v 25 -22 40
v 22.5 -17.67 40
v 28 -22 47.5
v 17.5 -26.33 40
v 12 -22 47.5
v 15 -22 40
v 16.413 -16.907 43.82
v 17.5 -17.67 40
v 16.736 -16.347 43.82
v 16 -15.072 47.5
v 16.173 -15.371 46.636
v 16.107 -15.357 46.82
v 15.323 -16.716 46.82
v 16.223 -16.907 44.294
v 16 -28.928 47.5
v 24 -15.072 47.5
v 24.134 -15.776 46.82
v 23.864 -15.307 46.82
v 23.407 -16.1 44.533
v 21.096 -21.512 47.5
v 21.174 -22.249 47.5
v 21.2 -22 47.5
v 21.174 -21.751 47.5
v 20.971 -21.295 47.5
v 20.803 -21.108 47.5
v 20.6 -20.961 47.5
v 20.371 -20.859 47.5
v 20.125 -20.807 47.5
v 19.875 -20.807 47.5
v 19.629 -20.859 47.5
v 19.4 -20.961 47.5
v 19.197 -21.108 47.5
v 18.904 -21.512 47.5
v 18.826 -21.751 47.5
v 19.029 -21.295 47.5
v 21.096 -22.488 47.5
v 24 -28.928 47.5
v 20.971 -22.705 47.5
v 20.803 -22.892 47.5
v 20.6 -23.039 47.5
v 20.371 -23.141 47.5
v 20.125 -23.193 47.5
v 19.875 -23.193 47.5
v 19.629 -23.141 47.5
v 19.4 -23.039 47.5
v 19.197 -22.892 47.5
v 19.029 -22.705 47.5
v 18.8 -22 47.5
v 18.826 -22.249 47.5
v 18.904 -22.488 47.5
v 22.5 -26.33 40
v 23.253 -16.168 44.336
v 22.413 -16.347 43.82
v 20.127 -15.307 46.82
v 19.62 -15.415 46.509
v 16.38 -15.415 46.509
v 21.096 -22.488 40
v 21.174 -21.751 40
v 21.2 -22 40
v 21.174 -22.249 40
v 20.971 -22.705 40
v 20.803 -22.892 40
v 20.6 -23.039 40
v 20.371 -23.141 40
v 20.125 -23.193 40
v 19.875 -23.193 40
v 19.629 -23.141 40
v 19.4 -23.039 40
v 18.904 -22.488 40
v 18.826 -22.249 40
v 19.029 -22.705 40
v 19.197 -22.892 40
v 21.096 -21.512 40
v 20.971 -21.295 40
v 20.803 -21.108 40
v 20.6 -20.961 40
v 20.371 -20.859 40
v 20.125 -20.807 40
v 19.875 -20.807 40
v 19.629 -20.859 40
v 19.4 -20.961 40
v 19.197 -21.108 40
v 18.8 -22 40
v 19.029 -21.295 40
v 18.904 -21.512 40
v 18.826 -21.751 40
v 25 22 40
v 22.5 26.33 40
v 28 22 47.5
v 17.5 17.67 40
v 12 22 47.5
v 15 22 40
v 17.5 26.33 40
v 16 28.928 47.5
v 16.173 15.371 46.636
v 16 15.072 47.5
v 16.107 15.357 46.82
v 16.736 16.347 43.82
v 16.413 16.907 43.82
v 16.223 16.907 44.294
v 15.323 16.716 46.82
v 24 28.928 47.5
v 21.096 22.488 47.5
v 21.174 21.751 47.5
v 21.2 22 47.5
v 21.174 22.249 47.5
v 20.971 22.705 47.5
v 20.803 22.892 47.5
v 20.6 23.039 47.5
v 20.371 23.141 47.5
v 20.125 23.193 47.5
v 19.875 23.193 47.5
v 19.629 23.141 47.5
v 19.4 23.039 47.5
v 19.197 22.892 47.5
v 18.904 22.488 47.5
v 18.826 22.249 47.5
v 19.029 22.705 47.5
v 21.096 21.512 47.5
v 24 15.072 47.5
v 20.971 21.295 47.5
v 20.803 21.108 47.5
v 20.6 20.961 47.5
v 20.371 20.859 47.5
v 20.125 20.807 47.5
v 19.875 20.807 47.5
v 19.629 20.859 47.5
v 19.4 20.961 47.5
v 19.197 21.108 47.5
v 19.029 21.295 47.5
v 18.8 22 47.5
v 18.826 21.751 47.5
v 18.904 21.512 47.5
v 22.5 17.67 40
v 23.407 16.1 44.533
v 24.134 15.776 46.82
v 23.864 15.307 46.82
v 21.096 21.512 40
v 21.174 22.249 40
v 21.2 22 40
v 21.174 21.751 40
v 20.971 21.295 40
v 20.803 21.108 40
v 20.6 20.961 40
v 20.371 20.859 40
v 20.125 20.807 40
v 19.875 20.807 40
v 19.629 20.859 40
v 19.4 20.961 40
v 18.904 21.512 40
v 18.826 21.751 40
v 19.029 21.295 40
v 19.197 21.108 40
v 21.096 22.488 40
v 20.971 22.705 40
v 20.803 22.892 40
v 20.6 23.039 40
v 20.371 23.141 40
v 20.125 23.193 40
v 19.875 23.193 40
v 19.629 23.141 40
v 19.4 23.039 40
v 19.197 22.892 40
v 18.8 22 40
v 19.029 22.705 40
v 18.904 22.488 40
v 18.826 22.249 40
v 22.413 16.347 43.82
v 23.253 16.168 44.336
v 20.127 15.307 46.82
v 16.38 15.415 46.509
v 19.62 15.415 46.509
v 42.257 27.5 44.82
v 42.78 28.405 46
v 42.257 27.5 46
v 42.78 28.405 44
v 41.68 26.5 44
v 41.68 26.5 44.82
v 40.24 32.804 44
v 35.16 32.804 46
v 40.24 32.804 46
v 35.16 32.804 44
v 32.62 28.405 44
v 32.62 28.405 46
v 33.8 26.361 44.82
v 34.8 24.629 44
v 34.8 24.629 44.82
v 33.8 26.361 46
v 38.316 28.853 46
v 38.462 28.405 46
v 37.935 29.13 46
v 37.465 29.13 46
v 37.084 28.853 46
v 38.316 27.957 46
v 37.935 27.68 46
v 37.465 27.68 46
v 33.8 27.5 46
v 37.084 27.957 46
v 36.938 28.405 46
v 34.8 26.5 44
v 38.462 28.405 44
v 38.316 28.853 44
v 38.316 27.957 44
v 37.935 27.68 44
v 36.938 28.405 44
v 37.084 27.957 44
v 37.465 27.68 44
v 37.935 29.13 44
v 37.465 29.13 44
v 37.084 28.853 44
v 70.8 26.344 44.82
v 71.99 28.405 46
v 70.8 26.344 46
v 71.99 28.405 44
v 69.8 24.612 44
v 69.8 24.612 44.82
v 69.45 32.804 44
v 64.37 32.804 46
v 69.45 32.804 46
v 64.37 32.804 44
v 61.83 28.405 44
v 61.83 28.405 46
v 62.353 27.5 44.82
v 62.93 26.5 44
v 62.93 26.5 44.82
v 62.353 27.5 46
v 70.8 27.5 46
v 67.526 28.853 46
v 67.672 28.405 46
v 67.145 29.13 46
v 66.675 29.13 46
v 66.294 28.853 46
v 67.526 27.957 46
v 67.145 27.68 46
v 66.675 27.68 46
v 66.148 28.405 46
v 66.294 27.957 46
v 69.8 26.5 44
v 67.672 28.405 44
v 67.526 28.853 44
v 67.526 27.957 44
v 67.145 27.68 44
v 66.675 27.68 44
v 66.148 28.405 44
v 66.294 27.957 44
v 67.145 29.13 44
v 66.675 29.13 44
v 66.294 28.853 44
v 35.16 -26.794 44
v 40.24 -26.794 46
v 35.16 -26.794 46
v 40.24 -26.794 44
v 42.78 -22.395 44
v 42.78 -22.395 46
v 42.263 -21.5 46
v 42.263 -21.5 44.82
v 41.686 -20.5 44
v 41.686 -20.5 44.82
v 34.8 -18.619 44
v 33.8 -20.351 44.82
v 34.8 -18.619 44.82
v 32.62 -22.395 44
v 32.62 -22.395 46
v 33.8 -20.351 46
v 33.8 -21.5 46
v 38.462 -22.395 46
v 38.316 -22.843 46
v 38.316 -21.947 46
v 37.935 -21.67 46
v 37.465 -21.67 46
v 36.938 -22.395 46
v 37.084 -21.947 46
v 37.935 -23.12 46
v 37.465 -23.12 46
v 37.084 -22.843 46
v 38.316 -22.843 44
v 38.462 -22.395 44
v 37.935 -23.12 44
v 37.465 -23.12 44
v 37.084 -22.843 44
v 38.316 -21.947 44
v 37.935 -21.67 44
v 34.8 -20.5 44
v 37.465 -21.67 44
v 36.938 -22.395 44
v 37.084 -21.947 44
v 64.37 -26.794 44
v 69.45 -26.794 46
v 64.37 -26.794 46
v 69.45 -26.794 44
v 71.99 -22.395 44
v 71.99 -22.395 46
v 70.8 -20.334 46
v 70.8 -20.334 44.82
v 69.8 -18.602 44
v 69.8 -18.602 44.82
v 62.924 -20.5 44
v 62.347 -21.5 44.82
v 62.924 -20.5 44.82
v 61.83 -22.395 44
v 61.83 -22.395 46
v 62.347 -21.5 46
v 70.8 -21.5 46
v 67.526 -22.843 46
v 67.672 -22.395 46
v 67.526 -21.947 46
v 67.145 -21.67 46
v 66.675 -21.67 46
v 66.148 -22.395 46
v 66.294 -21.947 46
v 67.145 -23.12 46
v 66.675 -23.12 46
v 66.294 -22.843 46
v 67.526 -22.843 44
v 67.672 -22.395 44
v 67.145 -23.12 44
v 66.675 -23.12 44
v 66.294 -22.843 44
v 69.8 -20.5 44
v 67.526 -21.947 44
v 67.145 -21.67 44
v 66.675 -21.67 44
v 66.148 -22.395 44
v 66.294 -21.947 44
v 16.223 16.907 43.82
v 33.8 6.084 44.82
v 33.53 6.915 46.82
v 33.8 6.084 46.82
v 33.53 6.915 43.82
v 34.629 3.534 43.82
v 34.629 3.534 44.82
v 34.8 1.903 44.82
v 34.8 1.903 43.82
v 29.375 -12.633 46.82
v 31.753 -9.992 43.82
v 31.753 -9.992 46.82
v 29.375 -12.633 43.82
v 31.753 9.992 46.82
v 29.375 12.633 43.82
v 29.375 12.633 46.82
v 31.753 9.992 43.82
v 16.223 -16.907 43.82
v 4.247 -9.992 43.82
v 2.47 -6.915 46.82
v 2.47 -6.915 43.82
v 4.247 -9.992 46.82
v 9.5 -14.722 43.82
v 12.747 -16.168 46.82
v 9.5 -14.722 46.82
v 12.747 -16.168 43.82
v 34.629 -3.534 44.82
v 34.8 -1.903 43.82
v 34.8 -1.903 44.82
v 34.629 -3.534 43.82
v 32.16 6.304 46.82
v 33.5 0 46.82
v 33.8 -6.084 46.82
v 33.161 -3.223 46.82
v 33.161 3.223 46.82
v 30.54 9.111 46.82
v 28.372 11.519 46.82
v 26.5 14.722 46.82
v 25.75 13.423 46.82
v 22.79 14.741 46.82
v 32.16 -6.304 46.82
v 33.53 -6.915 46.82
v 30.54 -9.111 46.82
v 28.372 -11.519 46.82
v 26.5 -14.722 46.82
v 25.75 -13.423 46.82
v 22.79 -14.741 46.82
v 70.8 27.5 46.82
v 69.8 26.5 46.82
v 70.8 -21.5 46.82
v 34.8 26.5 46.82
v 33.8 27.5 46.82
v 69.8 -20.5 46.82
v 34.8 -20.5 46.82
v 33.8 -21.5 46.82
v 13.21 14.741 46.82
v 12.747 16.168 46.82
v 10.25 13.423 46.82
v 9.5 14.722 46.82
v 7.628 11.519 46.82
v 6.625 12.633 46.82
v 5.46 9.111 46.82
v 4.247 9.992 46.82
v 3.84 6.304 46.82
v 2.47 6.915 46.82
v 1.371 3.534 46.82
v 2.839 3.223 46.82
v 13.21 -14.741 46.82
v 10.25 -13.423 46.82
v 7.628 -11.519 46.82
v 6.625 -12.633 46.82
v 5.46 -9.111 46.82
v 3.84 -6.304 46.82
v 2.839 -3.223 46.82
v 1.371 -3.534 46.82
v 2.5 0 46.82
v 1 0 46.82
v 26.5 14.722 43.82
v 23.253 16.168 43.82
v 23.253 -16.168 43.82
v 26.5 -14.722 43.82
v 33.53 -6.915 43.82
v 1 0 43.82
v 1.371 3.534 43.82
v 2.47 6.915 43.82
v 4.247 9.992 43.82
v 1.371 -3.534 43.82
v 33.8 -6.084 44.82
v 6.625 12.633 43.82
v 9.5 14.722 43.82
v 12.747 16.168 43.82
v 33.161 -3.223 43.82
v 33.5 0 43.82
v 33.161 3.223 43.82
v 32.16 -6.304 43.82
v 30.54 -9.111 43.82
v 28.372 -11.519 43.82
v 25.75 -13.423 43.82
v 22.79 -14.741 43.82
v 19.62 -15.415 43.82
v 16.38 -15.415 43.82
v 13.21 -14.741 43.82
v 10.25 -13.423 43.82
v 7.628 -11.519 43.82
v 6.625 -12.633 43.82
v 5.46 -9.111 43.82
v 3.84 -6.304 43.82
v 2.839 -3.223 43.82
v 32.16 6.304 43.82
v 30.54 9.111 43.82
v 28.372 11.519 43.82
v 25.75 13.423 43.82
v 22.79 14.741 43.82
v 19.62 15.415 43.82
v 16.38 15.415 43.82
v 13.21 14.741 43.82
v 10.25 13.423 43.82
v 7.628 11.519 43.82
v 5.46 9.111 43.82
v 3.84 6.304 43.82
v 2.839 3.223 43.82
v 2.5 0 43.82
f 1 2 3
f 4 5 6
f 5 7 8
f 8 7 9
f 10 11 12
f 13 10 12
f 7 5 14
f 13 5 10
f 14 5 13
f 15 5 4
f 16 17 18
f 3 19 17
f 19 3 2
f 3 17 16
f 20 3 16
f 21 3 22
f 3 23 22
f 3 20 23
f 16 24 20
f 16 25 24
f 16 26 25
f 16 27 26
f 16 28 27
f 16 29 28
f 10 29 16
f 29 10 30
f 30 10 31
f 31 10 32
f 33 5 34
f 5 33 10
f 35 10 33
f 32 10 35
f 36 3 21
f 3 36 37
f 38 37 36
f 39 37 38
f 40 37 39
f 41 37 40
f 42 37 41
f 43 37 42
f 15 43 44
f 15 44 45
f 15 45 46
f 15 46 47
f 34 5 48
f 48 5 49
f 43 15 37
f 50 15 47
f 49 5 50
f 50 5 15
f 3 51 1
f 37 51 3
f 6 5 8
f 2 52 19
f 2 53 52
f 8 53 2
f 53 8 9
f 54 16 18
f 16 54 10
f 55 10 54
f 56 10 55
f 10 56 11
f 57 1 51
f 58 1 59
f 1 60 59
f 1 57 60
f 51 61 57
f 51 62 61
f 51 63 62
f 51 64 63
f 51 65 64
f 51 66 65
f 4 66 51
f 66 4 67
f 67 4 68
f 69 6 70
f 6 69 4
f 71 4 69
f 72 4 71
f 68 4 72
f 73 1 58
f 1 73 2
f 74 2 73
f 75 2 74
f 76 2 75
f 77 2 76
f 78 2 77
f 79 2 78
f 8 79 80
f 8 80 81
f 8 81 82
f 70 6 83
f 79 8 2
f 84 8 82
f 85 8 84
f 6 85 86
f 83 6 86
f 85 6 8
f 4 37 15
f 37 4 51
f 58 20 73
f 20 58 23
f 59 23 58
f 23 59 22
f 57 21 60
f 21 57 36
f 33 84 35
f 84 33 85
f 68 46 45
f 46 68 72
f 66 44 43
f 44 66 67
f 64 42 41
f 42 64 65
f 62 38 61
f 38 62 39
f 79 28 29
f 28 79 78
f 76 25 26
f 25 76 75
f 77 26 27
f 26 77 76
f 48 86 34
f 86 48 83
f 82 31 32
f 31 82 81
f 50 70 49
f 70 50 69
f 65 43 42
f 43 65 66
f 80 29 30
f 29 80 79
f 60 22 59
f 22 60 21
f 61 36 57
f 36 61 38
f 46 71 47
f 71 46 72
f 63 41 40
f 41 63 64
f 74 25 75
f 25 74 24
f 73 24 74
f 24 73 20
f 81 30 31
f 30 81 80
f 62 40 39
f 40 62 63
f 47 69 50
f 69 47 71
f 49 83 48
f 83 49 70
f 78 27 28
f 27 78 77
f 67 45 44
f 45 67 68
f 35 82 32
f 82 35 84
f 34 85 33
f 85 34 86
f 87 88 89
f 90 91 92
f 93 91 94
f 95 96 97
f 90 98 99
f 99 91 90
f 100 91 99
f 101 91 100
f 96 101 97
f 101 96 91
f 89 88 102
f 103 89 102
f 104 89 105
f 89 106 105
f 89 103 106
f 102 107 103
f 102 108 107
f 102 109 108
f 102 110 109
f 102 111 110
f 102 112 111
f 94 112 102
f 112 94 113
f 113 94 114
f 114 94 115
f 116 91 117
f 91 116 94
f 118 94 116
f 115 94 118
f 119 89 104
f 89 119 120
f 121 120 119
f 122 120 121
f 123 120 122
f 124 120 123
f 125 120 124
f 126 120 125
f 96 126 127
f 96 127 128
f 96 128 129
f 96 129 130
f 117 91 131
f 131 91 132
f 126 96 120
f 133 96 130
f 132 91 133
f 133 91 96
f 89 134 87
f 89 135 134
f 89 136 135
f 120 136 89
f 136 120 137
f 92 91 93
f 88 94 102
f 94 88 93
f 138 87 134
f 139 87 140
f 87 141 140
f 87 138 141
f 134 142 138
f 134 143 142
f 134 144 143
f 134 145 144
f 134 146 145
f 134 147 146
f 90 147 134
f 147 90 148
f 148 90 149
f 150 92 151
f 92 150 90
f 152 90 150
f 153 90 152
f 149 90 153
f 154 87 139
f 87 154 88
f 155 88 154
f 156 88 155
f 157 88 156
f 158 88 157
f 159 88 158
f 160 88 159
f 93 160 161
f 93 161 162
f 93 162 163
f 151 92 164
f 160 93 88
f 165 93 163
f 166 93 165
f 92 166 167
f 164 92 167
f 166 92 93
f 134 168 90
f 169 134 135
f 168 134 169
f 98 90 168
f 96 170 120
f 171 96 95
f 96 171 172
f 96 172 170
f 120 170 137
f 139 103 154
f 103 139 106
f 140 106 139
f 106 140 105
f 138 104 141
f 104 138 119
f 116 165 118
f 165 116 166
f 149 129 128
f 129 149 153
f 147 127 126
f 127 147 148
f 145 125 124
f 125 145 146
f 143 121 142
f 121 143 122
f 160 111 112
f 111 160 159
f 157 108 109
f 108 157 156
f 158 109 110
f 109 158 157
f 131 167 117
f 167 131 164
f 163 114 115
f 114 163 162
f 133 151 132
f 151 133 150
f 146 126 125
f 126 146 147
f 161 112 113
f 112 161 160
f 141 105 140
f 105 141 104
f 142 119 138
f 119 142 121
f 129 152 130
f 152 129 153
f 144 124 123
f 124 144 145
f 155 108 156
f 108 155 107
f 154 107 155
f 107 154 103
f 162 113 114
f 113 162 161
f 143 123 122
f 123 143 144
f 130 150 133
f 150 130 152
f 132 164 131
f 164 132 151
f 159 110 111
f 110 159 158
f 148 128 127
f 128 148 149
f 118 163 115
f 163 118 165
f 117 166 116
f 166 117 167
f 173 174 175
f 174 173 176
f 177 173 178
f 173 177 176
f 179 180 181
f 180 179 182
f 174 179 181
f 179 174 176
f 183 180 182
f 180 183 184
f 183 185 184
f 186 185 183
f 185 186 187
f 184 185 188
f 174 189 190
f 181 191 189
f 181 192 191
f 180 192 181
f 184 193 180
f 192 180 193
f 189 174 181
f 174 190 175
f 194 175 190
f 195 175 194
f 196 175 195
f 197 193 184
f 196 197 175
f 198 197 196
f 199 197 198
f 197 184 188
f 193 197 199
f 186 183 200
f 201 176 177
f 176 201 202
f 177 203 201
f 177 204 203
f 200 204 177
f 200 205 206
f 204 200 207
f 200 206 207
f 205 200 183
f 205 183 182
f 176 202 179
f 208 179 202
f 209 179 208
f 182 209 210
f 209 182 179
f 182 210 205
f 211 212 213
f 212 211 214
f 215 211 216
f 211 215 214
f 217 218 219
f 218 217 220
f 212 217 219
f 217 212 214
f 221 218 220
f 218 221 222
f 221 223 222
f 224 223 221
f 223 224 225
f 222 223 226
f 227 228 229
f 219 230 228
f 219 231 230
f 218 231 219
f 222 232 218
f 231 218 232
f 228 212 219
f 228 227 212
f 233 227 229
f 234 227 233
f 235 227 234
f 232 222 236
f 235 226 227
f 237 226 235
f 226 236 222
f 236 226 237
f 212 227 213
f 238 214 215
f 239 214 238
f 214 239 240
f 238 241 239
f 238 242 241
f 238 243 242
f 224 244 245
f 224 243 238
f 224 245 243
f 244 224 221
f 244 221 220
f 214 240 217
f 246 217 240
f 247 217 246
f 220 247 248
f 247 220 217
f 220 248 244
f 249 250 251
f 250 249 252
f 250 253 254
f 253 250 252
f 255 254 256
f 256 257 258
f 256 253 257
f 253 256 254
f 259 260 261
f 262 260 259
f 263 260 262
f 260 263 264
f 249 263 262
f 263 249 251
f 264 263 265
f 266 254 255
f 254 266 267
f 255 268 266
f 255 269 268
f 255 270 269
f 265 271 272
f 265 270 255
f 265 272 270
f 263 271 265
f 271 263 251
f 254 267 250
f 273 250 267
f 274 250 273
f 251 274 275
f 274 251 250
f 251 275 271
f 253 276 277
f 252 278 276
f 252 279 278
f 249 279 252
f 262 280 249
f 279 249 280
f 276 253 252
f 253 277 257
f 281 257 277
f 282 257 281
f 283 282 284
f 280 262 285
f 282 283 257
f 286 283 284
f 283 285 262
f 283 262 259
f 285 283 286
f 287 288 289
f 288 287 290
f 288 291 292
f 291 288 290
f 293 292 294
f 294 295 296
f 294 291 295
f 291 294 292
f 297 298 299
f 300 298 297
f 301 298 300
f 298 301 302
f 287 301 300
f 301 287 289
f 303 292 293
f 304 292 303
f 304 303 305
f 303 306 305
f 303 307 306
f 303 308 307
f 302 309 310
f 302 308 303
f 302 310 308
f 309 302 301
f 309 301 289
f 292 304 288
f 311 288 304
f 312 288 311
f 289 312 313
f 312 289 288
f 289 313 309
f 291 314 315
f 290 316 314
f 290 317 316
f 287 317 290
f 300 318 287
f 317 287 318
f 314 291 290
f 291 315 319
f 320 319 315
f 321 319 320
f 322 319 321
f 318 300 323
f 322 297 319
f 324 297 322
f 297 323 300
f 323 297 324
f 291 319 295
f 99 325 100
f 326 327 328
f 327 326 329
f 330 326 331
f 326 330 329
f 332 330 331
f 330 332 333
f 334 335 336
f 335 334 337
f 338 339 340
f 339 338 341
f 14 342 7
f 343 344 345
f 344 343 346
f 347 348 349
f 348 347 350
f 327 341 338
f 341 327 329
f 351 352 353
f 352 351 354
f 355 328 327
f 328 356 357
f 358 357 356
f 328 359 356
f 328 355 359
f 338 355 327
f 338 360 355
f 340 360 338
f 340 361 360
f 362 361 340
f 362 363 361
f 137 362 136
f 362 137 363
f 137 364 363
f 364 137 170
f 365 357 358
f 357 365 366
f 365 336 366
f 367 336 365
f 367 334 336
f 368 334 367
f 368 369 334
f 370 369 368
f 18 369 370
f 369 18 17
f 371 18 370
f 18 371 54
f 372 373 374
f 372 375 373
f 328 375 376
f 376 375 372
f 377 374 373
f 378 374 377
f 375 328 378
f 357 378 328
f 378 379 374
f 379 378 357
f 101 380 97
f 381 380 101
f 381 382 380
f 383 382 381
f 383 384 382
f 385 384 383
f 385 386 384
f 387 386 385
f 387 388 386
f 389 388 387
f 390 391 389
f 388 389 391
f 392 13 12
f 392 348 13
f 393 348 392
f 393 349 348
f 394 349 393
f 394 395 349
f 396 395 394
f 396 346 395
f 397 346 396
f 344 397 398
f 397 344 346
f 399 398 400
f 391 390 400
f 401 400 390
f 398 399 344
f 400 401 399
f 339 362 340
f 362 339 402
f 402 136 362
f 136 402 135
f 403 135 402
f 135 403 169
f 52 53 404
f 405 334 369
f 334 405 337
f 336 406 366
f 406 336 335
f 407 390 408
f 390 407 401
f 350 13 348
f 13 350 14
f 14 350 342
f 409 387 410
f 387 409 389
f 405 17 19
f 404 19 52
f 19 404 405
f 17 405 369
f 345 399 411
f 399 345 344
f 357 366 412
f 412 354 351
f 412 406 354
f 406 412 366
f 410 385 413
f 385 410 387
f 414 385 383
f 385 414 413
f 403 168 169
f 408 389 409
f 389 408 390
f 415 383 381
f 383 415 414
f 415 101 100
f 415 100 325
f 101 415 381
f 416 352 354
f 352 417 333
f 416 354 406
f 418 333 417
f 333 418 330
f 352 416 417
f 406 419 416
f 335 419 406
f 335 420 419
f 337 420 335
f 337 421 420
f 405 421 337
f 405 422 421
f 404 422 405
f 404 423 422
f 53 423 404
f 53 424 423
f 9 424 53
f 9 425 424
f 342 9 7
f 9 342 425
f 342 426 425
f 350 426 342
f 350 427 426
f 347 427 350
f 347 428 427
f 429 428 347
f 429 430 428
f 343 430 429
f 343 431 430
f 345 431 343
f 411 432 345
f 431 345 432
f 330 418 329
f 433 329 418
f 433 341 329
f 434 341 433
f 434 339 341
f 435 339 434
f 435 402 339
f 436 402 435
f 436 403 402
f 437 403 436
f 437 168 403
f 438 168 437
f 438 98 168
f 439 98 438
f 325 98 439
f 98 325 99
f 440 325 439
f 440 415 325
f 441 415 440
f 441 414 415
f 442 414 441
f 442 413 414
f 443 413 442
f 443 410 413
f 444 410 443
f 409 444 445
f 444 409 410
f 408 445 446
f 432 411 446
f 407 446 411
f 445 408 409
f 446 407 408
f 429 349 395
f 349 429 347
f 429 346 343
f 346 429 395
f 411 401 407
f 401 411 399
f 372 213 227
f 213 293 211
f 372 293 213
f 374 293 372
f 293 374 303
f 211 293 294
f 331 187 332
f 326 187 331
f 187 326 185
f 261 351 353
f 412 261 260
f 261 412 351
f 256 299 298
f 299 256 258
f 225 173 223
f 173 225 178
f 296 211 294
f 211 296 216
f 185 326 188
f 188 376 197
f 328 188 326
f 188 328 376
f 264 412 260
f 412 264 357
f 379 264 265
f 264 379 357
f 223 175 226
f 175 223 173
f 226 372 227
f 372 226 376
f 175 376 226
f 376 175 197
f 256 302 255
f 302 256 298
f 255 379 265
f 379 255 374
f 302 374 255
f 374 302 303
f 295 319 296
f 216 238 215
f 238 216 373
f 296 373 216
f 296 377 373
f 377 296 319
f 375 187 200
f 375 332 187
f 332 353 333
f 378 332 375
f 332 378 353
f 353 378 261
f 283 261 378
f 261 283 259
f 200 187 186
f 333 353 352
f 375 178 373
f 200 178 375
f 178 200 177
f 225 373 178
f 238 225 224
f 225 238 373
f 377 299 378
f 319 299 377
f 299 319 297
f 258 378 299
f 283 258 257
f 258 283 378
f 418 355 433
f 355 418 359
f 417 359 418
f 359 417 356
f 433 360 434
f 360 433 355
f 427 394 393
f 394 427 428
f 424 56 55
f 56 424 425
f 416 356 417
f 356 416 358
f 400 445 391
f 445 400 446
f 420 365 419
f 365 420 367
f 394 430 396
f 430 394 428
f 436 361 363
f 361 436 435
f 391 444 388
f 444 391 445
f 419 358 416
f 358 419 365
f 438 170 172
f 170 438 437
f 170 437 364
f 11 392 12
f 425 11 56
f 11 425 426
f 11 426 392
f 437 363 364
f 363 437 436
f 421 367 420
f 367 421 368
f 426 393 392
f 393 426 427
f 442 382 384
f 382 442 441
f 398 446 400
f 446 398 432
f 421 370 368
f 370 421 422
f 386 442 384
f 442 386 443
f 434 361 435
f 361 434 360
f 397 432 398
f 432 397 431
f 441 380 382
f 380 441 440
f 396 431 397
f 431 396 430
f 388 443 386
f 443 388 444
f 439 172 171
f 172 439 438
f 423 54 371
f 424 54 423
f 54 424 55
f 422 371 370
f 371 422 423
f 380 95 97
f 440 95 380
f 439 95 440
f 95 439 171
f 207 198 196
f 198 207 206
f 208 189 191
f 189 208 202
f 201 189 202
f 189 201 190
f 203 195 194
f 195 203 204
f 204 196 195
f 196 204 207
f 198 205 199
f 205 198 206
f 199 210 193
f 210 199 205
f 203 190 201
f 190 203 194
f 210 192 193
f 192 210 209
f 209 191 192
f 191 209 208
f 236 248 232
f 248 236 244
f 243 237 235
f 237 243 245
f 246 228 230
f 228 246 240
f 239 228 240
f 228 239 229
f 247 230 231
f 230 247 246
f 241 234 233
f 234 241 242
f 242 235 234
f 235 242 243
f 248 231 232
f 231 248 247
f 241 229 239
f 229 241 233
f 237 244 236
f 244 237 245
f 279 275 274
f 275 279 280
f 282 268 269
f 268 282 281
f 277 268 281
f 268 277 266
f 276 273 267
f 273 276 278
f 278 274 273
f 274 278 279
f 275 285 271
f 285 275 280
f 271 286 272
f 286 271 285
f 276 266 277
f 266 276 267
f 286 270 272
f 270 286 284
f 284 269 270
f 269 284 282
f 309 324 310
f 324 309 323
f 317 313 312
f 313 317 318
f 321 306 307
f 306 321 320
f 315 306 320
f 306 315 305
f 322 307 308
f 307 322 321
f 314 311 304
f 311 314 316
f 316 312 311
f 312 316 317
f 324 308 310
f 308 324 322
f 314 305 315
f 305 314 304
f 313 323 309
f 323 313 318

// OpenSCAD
inch = 25.4;
W = 132.230;
MKY_R = 2;

inf = 200;
D_W = 47;
D_L = 35;
D_H = 10;
W_W = 38;
W_L = 31;
W_H = inf;

module screw_mount(h1, h2, side="bottom"){
  if(side == "bottom"){
    intersection(){
      color([1, 0, 0])difference(){
	cylinder(r1=8, r2 = 5, h=h1, $fn=6);
	translate([0, 0, -1])cylinder(r1=3, h=h1-2, $fn=30);
	translate([0, 0, -1])cylinder(r=1.6, h=h1 + 2, $fn=30);
      }
    }
  }
  else{
    color([0, 1, 0])difference(){
      translate([0, 0, h1 + 10])cylinder(r1=5., r2=8, h=h2, $fn=6);
      translate([0, 0, h1 - 1 + 10])cylinder(r=1.2, h=h2 + 2, $fn=30);  
    }
  }
}

module internal_space(){
  color([.5, .4, .5])intersection()
    {

      rotate(v=[1, 0, 0], a=90)
	linear_extrude(height = 400, center = true, convexity = 10)
	import (file = "proto1/side.dxf");
      color([0, 1, 0])
	translate([0, -W/2, 0]) 
	rotate(v=[0, 0, 1], a=90)rotate(a=90, v=[1, 0, 0])
	linear_extrude(height = 500, center = true, convexity = 10)
	import (file = "proto1/front.dxf");
      hull(){ // top outline
	translate([52, 49.6, 0])cylinder(d=35, h=100);
	translate([52, -49.6, 0])cylinder(d=35, h=100);
	translate([17, 0, 0])cylinder(d=34, h=100);
      }
      
    }
}

module my_solid(side="top"){ // "case" was taken
  intersection(){
    if(side=="top"){
      translate([-500, -500, + 30])cube([1000, 1000, 40]);       // top only
    }
    else{
      translate([-500, -500, -40 + 30])cube([1000, 1000, 40]); // bottom only
    }
    translate([MKY_R/2, 0, MKY_R/2])
      difference(){
      union(){
	minkowski(){
	  sphere(r=MKY_R);
	  internal_space();
	}
	if(side=="bottom"){
	  color([.5, .5, .5])
	    translate([17, 0, 2])
	    rotate(a=180, v=[0, 1, 0])
	    import("Garmin_Quarter_Turn_Plate.stl");
	}
      }
      // add shelf to internal space for electronics
      difference(){
      internal_space();
      // translate([-100, -100, 17.4])cube([200, 200, 1.5]);
      } 
    }
  }
}

module my_case(side="top"){
  difference(){
    union(){
      my_solid(side);
      if(side=="top"){
	// power up button support
	translate([16 + MKY_R, 0, 35.82-2.])cylinder(d=34, h=3); 
	// display support support
	translate([-1, -1, 8])
	translate([34.8 + MKY_R, -W_W/2, 35.82])
	  translate([(W_L - D_L)/2, W_W- D_W + 7.5,-D_H + 1])
	  cube([D_L + 2, D_W + 2, 2]);
	// display screw mounts
	for(dy = [0, -2*inch]){
	  for(dx = [0, 1.15*inch]){
	    difference(){
	      x = 37.7 + dx; 
	      y = 26.5 + .075*inch + dy;
	      z = 34.;
	      color([1, 0, 0])
		translate([x, y, z])cylinder(h = 2, d=.4*inch, $fn=6);
	      //translate([x, y, z-1])cylinder(h = .3*inch+2, d=.06*inch, $fn=6);
	    }
	  }
	}
      }
    }
    // display window
    translate([34.8 + MKY_R, -W_W/2, 35.82])
      union(){
      translate([(W_L - D_L)/2, W_W- D_W + 7.5,-D_H + 1])cube([D_L, D_W, D_H]);
      translate([0, 0, -0])cube([W_L, W_W, inf]);
    }
    translate([16 + MKY_R, 0, 1])
      cylinder(d=31, h=inf); // power up button hole
    translate([51, 49.6, 30])
      cylinder(d=.35*inch, h=inf, $fn=20); // encoder hole
    translate([51, -49.6, 30])
      cylinder(d=.35*inch, h=inf, $fn=20); // encoder hole
  }
}

module rim(){
  color([0, 1, 0])difference(){
    scale([1.0, 1.0, 1])translate([MKY_R/2, 0, MKY_R/2])internal_space();
    translate([1., 0, 0])scale([.98, .98, 1.05])translate([MKY_R/2, 0, MKY_R/2])internal_space();
    translate([-500, -500, 31])cube([1000, 1000, 10]);  
    translate([-500, -500, 0])cube([1000, 1000, 28]);  
  }
}

module screw_mounts(){
  /*
  intersection(){
    translate([MKY_R/2, 0, MKY_R/2])
      minkowski(){
      sphere(r=MKY_R);
      internal_space();
    }
    union(){
      translate([20, -22, 0])screw_mount(h1=30, h2=7.5, side="bottom");
      translate([20, 22, 0])screw_mount(h1=30, h2=7.5, side="bottom");
    }
  }
  */ // bottom
  union(){
    translate([20, -22, 0])screw_mount(h1=30, h2=7.5, side="top");
    translate([20, 22, 0])screw_mount(h1=30, h2=7.5, side="top");
  }
}
module shebang(){
  translate([0, 0, 10]) my_case("top");
  difference(){
    union(){
      my_case("bottom"); 
      rim();
    }
    translate([20, -22, 0])cylinder(h=50, r=3, $fn=50);
    translate([20, 22, 0])cylinder(h=50, r=3, $fn=50);
  }
}

// shebang();
screw_mounts(side="top");
difference(){
  translate([0, 0, 10]) my_case("top");
  translate([20, 22, 40]) cylinder(d=1.6, h=200);
  translate([20, -22, 40]) cylinder(d=1.6, h=200);
  // display screw holes
  for(dy = [0, -2*inch]){
    for(dx = [0, 1.15*inch]){
      difference(){
	x = 37.7 + dx; 
	y = 26.5 + .075*inch + dy;
	z = 34. + 10;
	translate([x, y, z - 1])cylinder(h = 3+1, d=.06*inch, $fn=10);
      }
    }
  }
}
